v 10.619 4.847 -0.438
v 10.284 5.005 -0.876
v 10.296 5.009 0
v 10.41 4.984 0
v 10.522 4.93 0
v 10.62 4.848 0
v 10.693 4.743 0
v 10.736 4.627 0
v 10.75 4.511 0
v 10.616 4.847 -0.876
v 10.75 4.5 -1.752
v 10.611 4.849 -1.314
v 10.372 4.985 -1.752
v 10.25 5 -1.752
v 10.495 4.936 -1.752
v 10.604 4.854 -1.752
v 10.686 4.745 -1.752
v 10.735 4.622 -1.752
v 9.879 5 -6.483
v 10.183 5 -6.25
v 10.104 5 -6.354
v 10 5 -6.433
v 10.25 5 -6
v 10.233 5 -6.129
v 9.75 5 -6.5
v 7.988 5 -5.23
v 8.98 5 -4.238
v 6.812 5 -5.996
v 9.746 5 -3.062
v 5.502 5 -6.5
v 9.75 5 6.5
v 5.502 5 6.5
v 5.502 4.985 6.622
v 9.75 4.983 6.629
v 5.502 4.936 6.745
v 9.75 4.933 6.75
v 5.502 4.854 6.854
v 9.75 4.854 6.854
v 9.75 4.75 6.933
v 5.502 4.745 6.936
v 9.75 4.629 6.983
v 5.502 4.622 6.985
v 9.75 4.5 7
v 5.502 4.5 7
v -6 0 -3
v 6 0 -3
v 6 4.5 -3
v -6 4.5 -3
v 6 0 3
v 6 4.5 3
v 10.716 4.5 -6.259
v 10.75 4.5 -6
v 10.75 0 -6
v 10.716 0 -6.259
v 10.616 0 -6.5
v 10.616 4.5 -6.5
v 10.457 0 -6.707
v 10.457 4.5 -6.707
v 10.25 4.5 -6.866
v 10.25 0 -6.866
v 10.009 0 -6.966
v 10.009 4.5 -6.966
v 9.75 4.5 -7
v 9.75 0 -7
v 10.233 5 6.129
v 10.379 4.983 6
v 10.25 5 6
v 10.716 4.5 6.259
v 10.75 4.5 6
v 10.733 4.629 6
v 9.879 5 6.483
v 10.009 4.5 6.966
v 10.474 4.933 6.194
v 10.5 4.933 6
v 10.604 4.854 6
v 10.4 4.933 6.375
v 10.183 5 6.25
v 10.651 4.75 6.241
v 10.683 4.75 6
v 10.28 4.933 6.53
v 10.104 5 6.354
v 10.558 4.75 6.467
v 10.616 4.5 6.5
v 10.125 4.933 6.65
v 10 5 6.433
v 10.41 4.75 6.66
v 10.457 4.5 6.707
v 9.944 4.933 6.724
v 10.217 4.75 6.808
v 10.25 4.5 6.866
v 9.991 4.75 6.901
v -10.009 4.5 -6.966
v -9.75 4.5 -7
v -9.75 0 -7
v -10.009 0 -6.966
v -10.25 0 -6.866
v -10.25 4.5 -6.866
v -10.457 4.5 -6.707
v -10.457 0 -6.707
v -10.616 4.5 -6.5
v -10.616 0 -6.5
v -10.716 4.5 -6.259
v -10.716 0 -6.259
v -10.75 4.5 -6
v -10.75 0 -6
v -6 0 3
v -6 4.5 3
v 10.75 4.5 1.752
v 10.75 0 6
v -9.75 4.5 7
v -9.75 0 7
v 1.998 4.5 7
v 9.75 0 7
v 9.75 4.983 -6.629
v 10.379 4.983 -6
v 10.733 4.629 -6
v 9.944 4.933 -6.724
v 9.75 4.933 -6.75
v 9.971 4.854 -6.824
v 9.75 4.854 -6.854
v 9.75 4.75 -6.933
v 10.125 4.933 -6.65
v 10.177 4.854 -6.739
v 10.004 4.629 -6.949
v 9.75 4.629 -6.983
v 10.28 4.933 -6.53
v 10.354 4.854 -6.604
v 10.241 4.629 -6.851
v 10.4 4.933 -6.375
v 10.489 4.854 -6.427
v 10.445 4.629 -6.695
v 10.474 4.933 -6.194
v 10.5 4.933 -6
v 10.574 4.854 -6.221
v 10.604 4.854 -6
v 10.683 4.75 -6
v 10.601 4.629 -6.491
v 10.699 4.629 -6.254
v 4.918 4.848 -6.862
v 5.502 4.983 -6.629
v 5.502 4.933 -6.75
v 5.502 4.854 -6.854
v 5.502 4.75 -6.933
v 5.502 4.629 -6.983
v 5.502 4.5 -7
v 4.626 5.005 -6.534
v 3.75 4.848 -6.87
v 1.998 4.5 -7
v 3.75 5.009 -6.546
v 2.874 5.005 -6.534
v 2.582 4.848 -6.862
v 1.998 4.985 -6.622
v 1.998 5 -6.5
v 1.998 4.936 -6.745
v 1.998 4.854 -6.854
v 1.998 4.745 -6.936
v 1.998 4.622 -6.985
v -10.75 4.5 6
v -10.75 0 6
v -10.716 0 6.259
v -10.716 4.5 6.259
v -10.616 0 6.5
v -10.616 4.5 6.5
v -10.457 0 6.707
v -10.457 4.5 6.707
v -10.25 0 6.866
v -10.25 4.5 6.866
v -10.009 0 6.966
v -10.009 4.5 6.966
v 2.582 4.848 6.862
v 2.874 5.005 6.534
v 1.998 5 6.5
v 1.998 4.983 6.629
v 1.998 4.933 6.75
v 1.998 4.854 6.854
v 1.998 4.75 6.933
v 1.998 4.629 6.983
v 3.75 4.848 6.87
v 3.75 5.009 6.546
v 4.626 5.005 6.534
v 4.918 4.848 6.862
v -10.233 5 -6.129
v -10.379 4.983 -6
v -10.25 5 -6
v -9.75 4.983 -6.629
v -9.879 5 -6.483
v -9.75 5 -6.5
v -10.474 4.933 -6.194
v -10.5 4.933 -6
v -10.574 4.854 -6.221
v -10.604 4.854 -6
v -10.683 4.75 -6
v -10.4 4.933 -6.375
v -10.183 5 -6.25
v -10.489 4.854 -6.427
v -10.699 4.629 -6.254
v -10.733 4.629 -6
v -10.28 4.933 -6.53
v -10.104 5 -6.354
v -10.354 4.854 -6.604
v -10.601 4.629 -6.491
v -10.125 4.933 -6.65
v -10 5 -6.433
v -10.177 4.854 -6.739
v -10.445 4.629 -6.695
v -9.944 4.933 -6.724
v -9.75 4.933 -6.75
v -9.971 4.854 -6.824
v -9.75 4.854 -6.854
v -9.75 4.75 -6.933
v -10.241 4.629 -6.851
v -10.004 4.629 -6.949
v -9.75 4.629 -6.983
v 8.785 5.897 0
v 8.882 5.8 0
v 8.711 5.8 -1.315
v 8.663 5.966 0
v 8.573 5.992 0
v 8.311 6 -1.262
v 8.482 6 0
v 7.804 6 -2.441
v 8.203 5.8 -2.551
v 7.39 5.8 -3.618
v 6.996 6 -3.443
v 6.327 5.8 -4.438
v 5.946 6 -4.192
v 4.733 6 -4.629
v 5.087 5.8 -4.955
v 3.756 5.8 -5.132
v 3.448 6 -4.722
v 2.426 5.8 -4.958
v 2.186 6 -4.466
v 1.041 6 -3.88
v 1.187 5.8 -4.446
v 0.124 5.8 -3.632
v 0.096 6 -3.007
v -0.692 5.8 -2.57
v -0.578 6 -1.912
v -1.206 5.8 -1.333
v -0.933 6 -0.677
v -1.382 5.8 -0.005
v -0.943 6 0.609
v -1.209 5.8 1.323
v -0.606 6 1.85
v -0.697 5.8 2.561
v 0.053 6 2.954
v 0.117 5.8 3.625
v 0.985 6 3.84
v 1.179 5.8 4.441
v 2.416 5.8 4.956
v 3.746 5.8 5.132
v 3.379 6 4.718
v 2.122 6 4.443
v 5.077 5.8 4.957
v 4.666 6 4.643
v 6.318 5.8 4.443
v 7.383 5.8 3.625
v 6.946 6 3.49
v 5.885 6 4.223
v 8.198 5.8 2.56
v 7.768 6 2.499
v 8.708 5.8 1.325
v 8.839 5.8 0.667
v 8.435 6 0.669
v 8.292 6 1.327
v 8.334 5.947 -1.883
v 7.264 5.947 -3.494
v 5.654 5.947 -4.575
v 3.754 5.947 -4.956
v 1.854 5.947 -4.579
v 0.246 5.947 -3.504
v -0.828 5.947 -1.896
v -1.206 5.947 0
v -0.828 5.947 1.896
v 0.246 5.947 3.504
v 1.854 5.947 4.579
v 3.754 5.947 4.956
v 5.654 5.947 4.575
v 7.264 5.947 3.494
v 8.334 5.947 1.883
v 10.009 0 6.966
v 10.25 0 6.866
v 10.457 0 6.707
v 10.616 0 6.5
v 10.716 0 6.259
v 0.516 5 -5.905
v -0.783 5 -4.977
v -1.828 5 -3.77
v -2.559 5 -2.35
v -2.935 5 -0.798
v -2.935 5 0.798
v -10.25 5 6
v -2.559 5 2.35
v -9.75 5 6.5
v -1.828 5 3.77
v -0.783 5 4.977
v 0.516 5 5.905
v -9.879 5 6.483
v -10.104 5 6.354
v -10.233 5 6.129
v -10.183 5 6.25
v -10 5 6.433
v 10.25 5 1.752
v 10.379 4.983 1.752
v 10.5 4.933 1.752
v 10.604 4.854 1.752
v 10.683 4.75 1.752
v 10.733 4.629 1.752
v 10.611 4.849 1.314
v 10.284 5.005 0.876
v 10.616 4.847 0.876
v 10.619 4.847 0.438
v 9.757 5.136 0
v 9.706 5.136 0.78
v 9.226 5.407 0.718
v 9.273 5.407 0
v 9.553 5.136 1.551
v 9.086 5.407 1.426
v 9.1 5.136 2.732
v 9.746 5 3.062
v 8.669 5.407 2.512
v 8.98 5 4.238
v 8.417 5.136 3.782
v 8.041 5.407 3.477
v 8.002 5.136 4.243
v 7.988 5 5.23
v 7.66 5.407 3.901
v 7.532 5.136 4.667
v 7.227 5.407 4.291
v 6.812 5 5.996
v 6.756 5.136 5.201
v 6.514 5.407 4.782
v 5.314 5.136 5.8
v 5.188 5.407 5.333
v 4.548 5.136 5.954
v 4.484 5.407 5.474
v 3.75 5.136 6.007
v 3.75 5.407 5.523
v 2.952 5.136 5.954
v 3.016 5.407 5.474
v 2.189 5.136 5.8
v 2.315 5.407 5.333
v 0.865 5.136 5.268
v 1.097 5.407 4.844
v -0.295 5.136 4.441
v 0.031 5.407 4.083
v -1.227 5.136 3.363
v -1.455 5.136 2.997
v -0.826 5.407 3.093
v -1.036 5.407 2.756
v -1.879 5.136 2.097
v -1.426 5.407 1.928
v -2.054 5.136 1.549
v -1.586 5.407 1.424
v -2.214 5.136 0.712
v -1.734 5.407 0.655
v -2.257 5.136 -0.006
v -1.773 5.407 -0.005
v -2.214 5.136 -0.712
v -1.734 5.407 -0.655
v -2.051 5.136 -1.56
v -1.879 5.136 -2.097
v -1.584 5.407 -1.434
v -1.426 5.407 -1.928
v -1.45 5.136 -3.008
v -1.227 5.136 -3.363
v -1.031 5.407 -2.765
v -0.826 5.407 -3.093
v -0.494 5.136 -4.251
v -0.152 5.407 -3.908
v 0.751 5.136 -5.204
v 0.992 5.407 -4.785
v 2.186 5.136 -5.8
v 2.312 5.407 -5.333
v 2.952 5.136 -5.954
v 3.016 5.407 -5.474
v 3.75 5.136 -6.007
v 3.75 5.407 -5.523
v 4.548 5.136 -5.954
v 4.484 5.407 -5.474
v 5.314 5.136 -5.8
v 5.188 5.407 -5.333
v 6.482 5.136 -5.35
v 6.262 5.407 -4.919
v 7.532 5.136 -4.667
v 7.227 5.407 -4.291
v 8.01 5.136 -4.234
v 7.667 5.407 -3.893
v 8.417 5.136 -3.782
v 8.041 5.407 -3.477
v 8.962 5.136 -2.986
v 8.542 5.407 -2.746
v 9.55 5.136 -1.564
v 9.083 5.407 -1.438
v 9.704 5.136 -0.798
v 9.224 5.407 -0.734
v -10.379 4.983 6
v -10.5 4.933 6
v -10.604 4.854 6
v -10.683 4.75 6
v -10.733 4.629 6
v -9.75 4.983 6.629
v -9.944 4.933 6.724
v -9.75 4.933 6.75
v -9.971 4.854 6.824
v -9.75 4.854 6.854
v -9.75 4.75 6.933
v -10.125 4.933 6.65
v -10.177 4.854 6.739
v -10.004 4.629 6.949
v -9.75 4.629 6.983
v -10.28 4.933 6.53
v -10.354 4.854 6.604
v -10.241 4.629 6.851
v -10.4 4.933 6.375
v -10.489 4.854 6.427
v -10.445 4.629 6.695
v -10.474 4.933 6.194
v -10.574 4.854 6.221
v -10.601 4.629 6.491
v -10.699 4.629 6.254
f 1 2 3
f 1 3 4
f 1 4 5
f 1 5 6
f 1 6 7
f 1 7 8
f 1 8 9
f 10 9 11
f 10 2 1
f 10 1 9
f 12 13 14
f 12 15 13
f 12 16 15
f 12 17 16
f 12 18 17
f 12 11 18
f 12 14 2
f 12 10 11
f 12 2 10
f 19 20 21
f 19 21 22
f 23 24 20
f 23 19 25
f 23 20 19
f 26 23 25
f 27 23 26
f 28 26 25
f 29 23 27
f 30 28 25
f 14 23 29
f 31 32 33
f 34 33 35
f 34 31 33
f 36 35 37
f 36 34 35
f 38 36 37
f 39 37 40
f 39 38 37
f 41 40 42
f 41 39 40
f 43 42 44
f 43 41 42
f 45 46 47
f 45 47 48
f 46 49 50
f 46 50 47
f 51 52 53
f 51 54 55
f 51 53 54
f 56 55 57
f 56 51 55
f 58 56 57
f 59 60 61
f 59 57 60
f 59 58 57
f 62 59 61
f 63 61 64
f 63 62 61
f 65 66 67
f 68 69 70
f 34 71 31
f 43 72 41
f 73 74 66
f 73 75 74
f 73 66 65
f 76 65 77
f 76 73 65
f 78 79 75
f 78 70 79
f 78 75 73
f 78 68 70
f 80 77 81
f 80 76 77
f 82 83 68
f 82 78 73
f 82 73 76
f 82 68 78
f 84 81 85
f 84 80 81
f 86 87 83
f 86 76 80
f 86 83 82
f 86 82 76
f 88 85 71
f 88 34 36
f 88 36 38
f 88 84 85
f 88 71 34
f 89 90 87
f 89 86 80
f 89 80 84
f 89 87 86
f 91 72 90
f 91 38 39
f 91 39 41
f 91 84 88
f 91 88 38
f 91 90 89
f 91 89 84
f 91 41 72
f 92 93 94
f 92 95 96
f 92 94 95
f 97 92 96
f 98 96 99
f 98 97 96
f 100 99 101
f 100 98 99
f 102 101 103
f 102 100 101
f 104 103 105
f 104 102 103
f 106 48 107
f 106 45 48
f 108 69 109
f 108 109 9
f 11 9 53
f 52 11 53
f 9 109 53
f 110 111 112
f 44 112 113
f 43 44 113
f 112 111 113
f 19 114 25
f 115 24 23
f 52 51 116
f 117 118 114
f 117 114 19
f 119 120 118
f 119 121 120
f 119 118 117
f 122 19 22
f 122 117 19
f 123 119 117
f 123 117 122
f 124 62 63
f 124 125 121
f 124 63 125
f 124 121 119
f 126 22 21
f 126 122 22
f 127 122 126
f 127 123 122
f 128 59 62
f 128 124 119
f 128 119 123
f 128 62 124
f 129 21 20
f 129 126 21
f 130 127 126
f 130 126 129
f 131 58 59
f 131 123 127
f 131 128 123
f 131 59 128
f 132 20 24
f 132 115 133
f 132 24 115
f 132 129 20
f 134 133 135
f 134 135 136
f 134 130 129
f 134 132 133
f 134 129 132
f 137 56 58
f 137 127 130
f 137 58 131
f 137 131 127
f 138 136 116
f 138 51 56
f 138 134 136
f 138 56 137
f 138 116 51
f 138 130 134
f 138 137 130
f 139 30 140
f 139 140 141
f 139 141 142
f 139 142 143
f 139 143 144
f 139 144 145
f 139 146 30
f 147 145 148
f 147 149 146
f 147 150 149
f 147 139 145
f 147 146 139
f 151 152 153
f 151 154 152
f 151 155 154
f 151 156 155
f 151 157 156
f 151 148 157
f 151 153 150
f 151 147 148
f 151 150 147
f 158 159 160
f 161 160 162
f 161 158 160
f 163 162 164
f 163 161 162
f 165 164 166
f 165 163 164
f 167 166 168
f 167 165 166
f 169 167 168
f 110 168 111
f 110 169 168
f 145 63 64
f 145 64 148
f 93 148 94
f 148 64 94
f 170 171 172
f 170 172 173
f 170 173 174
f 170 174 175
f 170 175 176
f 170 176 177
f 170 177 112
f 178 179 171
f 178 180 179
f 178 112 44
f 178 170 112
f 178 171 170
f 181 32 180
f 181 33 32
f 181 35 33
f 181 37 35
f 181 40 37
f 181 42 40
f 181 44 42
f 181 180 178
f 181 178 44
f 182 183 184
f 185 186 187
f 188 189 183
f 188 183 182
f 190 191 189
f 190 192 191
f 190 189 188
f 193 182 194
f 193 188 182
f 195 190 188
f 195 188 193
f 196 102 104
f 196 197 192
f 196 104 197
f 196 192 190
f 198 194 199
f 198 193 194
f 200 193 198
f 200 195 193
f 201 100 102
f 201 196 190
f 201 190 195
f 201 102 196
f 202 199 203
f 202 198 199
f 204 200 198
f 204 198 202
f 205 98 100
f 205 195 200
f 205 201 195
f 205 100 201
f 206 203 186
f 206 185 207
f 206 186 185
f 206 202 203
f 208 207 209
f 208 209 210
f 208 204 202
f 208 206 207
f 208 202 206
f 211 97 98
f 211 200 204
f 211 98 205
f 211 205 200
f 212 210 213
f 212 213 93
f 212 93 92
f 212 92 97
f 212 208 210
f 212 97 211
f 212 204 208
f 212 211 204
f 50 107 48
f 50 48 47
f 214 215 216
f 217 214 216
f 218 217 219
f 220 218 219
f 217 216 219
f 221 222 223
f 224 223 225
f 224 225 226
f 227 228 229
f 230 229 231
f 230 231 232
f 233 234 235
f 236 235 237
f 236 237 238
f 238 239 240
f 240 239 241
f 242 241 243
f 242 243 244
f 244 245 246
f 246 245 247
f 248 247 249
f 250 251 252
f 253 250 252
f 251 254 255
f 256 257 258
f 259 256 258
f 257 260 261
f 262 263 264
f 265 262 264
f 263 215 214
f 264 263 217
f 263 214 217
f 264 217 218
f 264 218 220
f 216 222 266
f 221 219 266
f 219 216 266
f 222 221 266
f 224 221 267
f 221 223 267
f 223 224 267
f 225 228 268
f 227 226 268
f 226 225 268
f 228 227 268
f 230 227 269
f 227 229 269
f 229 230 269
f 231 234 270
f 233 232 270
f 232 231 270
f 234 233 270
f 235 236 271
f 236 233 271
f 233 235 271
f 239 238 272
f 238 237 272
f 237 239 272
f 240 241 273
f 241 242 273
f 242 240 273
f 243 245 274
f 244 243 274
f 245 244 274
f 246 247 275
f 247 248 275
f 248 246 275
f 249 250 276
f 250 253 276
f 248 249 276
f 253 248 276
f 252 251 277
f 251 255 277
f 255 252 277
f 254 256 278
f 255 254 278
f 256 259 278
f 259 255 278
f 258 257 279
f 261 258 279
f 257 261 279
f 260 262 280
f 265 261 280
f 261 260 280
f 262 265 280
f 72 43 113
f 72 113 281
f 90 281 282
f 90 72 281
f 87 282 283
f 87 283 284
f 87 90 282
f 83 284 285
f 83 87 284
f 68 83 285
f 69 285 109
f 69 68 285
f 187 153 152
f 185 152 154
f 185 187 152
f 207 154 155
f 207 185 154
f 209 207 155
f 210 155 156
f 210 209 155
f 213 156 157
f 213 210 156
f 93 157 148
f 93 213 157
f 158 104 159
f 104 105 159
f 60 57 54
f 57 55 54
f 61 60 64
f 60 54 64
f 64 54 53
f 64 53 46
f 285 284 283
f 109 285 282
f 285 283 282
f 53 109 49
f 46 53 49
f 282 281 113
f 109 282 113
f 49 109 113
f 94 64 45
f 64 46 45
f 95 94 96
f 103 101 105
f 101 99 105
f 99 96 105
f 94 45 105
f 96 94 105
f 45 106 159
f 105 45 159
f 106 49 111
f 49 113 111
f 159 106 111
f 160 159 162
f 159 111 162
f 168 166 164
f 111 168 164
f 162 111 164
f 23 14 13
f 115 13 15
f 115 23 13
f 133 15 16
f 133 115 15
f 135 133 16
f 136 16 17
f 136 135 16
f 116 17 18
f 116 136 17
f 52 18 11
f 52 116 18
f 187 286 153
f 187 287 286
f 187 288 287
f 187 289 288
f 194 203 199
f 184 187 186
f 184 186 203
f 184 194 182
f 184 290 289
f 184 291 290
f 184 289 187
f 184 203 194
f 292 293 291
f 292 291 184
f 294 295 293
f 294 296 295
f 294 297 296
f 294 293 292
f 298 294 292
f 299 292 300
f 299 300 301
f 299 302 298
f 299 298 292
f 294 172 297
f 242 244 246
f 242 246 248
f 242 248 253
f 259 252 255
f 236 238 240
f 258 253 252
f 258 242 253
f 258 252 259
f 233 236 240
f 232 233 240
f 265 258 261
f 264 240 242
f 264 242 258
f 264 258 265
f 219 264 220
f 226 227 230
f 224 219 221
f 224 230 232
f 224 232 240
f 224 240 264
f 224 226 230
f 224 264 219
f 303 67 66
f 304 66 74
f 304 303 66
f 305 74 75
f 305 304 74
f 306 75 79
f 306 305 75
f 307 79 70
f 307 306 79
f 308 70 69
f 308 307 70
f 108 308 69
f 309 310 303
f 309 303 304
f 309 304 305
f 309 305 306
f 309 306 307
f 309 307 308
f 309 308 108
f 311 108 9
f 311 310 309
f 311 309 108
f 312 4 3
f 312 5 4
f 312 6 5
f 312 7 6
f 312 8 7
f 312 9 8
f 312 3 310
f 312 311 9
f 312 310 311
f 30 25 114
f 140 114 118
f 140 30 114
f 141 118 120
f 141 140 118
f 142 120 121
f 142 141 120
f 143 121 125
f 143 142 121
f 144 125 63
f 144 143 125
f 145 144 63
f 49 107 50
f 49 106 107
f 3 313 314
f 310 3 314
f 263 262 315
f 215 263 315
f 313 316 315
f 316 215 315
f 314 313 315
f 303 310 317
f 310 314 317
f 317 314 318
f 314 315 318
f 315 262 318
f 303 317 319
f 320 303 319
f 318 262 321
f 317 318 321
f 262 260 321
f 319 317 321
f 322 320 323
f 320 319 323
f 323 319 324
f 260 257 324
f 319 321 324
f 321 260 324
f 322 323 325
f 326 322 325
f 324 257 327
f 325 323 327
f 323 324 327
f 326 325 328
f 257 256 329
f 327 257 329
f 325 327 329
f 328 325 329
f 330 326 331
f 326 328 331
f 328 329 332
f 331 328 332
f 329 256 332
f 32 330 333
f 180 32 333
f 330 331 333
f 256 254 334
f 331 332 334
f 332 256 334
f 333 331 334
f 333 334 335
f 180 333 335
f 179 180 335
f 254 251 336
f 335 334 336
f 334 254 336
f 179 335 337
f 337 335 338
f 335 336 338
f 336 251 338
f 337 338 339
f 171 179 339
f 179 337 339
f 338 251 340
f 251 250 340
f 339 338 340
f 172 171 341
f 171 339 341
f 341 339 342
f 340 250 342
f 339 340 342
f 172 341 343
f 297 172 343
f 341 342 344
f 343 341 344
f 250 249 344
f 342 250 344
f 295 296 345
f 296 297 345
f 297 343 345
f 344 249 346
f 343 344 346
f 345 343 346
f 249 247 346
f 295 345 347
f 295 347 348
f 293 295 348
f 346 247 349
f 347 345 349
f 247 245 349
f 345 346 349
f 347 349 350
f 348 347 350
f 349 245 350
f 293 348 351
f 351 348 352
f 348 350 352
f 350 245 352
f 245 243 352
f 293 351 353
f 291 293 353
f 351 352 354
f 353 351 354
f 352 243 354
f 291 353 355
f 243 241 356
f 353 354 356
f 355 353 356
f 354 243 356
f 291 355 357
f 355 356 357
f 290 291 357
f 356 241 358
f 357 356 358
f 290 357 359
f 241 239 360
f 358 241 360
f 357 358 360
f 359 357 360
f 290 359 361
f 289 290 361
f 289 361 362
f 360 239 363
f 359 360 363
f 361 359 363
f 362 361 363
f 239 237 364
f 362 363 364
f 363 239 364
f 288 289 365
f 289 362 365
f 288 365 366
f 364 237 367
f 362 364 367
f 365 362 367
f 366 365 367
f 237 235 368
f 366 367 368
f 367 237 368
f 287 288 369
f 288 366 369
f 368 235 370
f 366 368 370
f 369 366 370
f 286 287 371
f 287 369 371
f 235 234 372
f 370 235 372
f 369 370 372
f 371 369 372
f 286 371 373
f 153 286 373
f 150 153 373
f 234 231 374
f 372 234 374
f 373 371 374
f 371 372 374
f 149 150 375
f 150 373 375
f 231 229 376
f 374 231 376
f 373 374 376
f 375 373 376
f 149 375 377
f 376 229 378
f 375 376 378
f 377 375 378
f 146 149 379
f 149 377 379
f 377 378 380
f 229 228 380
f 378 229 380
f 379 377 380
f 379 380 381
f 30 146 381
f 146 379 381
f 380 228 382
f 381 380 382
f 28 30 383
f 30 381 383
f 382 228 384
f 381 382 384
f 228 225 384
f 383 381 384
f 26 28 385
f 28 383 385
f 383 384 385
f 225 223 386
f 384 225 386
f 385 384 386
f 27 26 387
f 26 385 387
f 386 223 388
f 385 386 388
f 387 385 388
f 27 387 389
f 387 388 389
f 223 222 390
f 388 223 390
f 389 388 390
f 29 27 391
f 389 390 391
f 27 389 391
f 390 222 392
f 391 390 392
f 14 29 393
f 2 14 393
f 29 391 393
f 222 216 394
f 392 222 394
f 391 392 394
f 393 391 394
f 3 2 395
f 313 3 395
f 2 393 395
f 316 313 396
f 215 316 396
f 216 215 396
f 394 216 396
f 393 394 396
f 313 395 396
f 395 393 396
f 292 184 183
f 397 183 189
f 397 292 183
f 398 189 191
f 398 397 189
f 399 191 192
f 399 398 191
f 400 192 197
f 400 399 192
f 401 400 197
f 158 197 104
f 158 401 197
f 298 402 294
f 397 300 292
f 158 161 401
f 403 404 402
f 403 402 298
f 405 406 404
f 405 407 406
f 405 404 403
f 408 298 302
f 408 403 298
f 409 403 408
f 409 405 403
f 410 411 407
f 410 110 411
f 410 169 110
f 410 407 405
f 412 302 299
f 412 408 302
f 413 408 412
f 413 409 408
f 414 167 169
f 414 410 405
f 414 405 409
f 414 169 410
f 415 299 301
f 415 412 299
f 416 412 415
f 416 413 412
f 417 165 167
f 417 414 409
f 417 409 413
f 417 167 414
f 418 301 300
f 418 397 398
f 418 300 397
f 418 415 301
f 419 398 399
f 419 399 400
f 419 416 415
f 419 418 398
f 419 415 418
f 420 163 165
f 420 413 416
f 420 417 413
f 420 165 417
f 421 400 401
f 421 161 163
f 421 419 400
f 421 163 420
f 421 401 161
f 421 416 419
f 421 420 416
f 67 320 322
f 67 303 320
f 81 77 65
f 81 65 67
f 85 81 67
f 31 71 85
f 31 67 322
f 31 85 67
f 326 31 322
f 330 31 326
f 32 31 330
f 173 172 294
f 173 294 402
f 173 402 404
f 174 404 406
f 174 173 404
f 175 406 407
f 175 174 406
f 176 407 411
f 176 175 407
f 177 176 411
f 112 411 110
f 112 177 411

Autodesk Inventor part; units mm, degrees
ref_plane "YZ Plane" through (0, 0, 0) normal (1, 0, 0) x (0, 1, 0)
ref_plane "XZ Plane" through (0, 0, 0) normal (0, 1, 0) x (-1, 0, 0)
ref_plane "XY Plane" through (0, 0, 0) normal (0, 0, 1) x (1, 0, 0)
sketch "Sketch1" plane through (0, 0, 0) normal (0, 1, 0) x (-1, 0, 0)
  line L0 (10.75, 7) -> (-10.75, 7)
  line L1 (-10.75, 7) -> (-10.75, -7)
  line L2 (-10.75, -7) -> (10.75, -7)
  line L3 (10.75, -7) -> (10.75, 7)
  point P0 (0, 0)
  dimension "d0" = 21.5
  dimension "d1" = 14
  dimension "d2" = 10.75
  dimension "d3" = 7
extrude "Extrusion1" add sketch "Sketch1" along normal blind 5
sketch "Sketch2" plane through (0, 5, 0) normal (0, 1, 0) x (1, 0, 0)
  circle A0 centre (3.75, 0) radius 5
  line L0 (10.75, 7) -> (-10.75, 7) projected
  line L1 (10.75, -7) -> (10.75, 7) projected
  point P0 (0, 0)
  dimension "d6" = 10
  dimension "d7" = 7
  dimension "d8" = 7
extrude "Extrusion2" add sketch "Sketch2" along normal blind 1
fillet "Fillet1" radius 2 1 edges at (-1.25, 5, 0)
fillet "Fillet2" radius 1 4 edges at (10.75, 2.5, 7) (10.75, 2.5, -7) (-10.75, 2.5, 7) (-10.75, 2.5, -7)
fillet "Fillet3" radius 0.5 9 edges at (-1.25, 6, 0) (10.4571, 5, 6.7071) (10.75, 5, 0) (10.4571, 5, -6.7071) (0, 5, -7) (-10.4571, 5, -6.7071) (-10.75, 5, 0) (-10.4571, 5, 6.7071) (0, 5, 7)
sketch "Sketch3" plane through (0, 0, 0) normal (0, -1, 0) x (1, 0, 0)
  line L0 (-6, 3) -> (6, 3)
  line L1 (6, 3) -> (6, -3)
  line L2 (6, -3) -> (-6, -3)
  line L3 (-6, -3) -> (-6, 3)
  line L4 (-9.75, 7) -> (9.75, 7) projected
  point P0 (0, 0)
  dimension "d14" = 12
  dimension "d15" = 6
  dimension "d16" = 4
  dimension "d17" = 6
extrude "Extrusion3" cut sketch "Sketch3" against normal blind 4.5
properties part number "Black_Keyboard_Button"
